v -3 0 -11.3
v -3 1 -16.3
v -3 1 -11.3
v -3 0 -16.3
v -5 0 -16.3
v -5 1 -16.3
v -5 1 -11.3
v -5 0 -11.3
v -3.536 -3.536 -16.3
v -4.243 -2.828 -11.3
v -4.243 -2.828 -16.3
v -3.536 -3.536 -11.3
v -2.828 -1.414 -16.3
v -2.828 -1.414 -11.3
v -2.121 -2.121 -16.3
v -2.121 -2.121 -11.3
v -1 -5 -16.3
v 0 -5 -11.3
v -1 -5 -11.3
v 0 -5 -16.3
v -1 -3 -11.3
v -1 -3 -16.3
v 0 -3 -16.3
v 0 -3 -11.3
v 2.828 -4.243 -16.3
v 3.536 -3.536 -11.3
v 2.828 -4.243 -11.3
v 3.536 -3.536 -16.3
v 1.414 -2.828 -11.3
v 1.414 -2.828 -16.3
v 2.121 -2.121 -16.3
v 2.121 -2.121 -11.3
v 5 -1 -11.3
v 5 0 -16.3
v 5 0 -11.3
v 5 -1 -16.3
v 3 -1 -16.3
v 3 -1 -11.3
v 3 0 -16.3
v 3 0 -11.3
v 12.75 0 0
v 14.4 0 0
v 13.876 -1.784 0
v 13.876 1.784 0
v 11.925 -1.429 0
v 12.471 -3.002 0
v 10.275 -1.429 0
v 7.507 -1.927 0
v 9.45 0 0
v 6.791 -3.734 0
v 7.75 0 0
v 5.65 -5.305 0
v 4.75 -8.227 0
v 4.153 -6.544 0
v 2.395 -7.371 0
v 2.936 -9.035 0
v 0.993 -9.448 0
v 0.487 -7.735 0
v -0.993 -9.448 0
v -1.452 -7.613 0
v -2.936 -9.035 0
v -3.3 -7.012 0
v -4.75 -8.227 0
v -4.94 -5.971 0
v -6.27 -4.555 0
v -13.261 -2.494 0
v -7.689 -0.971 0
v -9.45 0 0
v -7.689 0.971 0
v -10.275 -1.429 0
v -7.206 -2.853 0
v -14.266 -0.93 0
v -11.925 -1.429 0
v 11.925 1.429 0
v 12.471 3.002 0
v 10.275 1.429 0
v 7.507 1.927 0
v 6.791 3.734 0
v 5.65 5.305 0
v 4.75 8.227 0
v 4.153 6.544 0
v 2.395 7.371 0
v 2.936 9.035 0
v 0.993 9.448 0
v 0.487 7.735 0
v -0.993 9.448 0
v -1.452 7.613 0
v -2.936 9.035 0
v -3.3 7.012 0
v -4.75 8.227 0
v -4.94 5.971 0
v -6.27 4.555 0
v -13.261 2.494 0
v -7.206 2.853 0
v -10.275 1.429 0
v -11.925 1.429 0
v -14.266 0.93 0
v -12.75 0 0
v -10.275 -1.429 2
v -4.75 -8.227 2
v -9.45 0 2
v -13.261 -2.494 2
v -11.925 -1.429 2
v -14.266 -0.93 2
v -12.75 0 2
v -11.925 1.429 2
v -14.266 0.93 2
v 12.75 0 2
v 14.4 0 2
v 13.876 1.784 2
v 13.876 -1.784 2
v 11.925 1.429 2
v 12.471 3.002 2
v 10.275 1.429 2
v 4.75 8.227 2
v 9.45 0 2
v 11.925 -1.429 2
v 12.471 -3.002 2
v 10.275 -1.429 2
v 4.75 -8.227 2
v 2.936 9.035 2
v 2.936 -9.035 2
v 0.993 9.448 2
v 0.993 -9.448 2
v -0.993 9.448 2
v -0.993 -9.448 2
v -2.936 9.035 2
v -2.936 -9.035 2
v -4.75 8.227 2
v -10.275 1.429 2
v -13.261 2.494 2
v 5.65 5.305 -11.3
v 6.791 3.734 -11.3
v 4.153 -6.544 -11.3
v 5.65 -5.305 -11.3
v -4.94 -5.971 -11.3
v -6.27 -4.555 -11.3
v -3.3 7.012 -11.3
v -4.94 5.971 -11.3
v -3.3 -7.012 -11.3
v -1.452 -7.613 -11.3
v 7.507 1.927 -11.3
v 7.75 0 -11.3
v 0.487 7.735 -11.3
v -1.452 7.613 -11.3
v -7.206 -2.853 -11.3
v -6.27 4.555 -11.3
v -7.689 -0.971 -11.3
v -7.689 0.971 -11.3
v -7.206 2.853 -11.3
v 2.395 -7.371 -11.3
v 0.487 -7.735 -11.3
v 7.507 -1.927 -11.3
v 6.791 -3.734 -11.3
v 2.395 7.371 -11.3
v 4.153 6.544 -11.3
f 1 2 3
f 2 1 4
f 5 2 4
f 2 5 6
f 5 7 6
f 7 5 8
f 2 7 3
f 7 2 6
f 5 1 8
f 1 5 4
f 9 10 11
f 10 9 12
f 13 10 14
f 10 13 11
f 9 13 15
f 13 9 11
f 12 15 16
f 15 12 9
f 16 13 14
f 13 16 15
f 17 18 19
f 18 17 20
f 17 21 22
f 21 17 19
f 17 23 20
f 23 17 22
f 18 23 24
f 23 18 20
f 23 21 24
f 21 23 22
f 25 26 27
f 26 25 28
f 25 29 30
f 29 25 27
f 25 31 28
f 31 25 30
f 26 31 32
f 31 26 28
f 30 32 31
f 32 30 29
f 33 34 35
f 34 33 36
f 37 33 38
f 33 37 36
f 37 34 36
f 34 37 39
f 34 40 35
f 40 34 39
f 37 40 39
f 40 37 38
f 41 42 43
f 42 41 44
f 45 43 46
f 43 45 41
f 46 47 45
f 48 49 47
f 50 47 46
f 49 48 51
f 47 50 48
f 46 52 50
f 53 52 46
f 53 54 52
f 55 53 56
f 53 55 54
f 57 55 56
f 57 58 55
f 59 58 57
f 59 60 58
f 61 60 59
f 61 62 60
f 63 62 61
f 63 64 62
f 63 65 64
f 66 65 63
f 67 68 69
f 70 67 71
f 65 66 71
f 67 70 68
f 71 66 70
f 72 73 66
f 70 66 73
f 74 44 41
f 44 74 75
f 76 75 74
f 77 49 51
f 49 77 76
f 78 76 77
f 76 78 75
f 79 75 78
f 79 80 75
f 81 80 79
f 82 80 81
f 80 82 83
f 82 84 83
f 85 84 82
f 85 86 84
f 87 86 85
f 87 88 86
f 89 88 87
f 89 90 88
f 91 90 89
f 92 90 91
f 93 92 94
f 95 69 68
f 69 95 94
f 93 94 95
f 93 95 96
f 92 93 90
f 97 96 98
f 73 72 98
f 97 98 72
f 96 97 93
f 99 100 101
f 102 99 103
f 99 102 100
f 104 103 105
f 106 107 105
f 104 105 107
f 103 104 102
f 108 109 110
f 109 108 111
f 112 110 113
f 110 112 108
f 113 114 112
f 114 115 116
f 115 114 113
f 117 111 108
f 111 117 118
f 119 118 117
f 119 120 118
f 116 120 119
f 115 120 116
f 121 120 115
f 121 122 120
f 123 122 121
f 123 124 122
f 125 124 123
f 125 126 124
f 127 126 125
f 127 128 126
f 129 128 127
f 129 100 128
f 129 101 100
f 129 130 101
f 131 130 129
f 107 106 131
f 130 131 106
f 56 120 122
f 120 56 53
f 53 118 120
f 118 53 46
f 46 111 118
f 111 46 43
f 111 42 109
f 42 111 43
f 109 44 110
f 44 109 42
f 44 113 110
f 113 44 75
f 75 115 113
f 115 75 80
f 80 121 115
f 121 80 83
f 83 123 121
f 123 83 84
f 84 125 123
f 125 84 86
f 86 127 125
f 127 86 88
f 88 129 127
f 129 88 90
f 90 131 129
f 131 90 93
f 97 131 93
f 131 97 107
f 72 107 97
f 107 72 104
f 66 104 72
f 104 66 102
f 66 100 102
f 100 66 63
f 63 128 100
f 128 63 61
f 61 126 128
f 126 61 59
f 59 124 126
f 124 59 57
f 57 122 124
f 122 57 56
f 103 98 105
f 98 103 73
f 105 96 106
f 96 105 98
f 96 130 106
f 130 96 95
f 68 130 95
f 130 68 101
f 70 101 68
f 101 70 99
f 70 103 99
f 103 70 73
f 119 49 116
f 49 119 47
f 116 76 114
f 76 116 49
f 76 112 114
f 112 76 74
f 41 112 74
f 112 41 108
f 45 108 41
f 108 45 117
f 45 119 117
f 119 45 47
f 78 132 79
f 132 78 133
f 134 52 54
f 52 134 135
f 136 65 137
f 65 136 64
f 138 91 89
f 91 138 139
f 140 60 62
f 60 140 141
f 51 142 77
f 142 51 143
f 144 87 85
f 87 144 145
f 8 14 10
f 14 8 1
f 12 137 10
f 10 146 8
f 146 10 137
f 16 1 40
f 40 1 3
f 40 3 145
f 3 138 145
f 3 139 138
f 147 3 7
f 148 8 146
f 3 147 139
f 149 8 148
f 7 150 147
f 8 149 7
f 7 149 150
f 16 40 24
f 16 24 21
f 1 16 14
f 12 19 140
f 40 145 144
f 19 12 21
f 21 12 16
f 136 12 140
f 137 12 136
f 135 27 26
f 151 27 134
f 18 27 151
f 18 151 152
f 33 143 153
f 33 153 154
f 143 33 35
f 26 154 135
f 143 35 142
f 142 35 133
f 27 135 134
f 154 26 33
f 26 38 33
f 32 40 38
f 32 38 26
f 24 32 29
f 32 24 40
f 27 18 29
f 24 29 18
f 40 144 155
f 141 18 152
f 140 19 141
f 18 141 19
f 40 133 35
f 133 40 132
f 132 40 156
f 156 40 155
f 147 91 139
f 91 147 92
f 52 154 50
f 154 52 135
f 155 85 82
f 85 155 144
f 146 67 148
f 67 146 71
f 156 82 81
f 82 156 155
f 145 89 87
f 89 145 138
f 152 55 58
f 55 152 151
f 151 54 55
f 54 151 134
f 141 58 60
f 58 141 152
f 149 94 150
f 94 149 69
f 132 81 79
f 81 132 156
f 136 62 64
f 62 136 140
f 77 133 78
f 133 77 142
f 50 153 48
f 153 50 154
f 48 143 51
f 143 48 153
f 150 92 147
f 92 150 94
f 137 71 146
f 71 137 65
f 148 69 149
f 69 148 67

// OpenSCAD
//cutout parameter :
//  center hole : 16 mm
//  screw hole : 3.3mm
//  screw hole distance : 22.2 mm


module midi_connector()  {
    module contact() {
        translate([-1,0,-5]) cube([2,1,6]);
    }
    linear_extrude(height=2)
        difference() {
            hull(){
                translate([-11.1,0]) circle(d=6.6);
                translate([11.1,0]) circle(d=6.6);
                circle(d=19);
            }
            {
                translate([-11.1,0]) circle(d=3.3);
                translate([11.1,0]) circle(d=3.3);
            }
        }
     mirror(v=[0,0,1]) cylinder(d=15.5,h=11.3);
     for (a = [0:45:180]) {
        rotate([0,0,a]) translate([-4,0,-11.3]) contact();
     }
}

midi_connector();
